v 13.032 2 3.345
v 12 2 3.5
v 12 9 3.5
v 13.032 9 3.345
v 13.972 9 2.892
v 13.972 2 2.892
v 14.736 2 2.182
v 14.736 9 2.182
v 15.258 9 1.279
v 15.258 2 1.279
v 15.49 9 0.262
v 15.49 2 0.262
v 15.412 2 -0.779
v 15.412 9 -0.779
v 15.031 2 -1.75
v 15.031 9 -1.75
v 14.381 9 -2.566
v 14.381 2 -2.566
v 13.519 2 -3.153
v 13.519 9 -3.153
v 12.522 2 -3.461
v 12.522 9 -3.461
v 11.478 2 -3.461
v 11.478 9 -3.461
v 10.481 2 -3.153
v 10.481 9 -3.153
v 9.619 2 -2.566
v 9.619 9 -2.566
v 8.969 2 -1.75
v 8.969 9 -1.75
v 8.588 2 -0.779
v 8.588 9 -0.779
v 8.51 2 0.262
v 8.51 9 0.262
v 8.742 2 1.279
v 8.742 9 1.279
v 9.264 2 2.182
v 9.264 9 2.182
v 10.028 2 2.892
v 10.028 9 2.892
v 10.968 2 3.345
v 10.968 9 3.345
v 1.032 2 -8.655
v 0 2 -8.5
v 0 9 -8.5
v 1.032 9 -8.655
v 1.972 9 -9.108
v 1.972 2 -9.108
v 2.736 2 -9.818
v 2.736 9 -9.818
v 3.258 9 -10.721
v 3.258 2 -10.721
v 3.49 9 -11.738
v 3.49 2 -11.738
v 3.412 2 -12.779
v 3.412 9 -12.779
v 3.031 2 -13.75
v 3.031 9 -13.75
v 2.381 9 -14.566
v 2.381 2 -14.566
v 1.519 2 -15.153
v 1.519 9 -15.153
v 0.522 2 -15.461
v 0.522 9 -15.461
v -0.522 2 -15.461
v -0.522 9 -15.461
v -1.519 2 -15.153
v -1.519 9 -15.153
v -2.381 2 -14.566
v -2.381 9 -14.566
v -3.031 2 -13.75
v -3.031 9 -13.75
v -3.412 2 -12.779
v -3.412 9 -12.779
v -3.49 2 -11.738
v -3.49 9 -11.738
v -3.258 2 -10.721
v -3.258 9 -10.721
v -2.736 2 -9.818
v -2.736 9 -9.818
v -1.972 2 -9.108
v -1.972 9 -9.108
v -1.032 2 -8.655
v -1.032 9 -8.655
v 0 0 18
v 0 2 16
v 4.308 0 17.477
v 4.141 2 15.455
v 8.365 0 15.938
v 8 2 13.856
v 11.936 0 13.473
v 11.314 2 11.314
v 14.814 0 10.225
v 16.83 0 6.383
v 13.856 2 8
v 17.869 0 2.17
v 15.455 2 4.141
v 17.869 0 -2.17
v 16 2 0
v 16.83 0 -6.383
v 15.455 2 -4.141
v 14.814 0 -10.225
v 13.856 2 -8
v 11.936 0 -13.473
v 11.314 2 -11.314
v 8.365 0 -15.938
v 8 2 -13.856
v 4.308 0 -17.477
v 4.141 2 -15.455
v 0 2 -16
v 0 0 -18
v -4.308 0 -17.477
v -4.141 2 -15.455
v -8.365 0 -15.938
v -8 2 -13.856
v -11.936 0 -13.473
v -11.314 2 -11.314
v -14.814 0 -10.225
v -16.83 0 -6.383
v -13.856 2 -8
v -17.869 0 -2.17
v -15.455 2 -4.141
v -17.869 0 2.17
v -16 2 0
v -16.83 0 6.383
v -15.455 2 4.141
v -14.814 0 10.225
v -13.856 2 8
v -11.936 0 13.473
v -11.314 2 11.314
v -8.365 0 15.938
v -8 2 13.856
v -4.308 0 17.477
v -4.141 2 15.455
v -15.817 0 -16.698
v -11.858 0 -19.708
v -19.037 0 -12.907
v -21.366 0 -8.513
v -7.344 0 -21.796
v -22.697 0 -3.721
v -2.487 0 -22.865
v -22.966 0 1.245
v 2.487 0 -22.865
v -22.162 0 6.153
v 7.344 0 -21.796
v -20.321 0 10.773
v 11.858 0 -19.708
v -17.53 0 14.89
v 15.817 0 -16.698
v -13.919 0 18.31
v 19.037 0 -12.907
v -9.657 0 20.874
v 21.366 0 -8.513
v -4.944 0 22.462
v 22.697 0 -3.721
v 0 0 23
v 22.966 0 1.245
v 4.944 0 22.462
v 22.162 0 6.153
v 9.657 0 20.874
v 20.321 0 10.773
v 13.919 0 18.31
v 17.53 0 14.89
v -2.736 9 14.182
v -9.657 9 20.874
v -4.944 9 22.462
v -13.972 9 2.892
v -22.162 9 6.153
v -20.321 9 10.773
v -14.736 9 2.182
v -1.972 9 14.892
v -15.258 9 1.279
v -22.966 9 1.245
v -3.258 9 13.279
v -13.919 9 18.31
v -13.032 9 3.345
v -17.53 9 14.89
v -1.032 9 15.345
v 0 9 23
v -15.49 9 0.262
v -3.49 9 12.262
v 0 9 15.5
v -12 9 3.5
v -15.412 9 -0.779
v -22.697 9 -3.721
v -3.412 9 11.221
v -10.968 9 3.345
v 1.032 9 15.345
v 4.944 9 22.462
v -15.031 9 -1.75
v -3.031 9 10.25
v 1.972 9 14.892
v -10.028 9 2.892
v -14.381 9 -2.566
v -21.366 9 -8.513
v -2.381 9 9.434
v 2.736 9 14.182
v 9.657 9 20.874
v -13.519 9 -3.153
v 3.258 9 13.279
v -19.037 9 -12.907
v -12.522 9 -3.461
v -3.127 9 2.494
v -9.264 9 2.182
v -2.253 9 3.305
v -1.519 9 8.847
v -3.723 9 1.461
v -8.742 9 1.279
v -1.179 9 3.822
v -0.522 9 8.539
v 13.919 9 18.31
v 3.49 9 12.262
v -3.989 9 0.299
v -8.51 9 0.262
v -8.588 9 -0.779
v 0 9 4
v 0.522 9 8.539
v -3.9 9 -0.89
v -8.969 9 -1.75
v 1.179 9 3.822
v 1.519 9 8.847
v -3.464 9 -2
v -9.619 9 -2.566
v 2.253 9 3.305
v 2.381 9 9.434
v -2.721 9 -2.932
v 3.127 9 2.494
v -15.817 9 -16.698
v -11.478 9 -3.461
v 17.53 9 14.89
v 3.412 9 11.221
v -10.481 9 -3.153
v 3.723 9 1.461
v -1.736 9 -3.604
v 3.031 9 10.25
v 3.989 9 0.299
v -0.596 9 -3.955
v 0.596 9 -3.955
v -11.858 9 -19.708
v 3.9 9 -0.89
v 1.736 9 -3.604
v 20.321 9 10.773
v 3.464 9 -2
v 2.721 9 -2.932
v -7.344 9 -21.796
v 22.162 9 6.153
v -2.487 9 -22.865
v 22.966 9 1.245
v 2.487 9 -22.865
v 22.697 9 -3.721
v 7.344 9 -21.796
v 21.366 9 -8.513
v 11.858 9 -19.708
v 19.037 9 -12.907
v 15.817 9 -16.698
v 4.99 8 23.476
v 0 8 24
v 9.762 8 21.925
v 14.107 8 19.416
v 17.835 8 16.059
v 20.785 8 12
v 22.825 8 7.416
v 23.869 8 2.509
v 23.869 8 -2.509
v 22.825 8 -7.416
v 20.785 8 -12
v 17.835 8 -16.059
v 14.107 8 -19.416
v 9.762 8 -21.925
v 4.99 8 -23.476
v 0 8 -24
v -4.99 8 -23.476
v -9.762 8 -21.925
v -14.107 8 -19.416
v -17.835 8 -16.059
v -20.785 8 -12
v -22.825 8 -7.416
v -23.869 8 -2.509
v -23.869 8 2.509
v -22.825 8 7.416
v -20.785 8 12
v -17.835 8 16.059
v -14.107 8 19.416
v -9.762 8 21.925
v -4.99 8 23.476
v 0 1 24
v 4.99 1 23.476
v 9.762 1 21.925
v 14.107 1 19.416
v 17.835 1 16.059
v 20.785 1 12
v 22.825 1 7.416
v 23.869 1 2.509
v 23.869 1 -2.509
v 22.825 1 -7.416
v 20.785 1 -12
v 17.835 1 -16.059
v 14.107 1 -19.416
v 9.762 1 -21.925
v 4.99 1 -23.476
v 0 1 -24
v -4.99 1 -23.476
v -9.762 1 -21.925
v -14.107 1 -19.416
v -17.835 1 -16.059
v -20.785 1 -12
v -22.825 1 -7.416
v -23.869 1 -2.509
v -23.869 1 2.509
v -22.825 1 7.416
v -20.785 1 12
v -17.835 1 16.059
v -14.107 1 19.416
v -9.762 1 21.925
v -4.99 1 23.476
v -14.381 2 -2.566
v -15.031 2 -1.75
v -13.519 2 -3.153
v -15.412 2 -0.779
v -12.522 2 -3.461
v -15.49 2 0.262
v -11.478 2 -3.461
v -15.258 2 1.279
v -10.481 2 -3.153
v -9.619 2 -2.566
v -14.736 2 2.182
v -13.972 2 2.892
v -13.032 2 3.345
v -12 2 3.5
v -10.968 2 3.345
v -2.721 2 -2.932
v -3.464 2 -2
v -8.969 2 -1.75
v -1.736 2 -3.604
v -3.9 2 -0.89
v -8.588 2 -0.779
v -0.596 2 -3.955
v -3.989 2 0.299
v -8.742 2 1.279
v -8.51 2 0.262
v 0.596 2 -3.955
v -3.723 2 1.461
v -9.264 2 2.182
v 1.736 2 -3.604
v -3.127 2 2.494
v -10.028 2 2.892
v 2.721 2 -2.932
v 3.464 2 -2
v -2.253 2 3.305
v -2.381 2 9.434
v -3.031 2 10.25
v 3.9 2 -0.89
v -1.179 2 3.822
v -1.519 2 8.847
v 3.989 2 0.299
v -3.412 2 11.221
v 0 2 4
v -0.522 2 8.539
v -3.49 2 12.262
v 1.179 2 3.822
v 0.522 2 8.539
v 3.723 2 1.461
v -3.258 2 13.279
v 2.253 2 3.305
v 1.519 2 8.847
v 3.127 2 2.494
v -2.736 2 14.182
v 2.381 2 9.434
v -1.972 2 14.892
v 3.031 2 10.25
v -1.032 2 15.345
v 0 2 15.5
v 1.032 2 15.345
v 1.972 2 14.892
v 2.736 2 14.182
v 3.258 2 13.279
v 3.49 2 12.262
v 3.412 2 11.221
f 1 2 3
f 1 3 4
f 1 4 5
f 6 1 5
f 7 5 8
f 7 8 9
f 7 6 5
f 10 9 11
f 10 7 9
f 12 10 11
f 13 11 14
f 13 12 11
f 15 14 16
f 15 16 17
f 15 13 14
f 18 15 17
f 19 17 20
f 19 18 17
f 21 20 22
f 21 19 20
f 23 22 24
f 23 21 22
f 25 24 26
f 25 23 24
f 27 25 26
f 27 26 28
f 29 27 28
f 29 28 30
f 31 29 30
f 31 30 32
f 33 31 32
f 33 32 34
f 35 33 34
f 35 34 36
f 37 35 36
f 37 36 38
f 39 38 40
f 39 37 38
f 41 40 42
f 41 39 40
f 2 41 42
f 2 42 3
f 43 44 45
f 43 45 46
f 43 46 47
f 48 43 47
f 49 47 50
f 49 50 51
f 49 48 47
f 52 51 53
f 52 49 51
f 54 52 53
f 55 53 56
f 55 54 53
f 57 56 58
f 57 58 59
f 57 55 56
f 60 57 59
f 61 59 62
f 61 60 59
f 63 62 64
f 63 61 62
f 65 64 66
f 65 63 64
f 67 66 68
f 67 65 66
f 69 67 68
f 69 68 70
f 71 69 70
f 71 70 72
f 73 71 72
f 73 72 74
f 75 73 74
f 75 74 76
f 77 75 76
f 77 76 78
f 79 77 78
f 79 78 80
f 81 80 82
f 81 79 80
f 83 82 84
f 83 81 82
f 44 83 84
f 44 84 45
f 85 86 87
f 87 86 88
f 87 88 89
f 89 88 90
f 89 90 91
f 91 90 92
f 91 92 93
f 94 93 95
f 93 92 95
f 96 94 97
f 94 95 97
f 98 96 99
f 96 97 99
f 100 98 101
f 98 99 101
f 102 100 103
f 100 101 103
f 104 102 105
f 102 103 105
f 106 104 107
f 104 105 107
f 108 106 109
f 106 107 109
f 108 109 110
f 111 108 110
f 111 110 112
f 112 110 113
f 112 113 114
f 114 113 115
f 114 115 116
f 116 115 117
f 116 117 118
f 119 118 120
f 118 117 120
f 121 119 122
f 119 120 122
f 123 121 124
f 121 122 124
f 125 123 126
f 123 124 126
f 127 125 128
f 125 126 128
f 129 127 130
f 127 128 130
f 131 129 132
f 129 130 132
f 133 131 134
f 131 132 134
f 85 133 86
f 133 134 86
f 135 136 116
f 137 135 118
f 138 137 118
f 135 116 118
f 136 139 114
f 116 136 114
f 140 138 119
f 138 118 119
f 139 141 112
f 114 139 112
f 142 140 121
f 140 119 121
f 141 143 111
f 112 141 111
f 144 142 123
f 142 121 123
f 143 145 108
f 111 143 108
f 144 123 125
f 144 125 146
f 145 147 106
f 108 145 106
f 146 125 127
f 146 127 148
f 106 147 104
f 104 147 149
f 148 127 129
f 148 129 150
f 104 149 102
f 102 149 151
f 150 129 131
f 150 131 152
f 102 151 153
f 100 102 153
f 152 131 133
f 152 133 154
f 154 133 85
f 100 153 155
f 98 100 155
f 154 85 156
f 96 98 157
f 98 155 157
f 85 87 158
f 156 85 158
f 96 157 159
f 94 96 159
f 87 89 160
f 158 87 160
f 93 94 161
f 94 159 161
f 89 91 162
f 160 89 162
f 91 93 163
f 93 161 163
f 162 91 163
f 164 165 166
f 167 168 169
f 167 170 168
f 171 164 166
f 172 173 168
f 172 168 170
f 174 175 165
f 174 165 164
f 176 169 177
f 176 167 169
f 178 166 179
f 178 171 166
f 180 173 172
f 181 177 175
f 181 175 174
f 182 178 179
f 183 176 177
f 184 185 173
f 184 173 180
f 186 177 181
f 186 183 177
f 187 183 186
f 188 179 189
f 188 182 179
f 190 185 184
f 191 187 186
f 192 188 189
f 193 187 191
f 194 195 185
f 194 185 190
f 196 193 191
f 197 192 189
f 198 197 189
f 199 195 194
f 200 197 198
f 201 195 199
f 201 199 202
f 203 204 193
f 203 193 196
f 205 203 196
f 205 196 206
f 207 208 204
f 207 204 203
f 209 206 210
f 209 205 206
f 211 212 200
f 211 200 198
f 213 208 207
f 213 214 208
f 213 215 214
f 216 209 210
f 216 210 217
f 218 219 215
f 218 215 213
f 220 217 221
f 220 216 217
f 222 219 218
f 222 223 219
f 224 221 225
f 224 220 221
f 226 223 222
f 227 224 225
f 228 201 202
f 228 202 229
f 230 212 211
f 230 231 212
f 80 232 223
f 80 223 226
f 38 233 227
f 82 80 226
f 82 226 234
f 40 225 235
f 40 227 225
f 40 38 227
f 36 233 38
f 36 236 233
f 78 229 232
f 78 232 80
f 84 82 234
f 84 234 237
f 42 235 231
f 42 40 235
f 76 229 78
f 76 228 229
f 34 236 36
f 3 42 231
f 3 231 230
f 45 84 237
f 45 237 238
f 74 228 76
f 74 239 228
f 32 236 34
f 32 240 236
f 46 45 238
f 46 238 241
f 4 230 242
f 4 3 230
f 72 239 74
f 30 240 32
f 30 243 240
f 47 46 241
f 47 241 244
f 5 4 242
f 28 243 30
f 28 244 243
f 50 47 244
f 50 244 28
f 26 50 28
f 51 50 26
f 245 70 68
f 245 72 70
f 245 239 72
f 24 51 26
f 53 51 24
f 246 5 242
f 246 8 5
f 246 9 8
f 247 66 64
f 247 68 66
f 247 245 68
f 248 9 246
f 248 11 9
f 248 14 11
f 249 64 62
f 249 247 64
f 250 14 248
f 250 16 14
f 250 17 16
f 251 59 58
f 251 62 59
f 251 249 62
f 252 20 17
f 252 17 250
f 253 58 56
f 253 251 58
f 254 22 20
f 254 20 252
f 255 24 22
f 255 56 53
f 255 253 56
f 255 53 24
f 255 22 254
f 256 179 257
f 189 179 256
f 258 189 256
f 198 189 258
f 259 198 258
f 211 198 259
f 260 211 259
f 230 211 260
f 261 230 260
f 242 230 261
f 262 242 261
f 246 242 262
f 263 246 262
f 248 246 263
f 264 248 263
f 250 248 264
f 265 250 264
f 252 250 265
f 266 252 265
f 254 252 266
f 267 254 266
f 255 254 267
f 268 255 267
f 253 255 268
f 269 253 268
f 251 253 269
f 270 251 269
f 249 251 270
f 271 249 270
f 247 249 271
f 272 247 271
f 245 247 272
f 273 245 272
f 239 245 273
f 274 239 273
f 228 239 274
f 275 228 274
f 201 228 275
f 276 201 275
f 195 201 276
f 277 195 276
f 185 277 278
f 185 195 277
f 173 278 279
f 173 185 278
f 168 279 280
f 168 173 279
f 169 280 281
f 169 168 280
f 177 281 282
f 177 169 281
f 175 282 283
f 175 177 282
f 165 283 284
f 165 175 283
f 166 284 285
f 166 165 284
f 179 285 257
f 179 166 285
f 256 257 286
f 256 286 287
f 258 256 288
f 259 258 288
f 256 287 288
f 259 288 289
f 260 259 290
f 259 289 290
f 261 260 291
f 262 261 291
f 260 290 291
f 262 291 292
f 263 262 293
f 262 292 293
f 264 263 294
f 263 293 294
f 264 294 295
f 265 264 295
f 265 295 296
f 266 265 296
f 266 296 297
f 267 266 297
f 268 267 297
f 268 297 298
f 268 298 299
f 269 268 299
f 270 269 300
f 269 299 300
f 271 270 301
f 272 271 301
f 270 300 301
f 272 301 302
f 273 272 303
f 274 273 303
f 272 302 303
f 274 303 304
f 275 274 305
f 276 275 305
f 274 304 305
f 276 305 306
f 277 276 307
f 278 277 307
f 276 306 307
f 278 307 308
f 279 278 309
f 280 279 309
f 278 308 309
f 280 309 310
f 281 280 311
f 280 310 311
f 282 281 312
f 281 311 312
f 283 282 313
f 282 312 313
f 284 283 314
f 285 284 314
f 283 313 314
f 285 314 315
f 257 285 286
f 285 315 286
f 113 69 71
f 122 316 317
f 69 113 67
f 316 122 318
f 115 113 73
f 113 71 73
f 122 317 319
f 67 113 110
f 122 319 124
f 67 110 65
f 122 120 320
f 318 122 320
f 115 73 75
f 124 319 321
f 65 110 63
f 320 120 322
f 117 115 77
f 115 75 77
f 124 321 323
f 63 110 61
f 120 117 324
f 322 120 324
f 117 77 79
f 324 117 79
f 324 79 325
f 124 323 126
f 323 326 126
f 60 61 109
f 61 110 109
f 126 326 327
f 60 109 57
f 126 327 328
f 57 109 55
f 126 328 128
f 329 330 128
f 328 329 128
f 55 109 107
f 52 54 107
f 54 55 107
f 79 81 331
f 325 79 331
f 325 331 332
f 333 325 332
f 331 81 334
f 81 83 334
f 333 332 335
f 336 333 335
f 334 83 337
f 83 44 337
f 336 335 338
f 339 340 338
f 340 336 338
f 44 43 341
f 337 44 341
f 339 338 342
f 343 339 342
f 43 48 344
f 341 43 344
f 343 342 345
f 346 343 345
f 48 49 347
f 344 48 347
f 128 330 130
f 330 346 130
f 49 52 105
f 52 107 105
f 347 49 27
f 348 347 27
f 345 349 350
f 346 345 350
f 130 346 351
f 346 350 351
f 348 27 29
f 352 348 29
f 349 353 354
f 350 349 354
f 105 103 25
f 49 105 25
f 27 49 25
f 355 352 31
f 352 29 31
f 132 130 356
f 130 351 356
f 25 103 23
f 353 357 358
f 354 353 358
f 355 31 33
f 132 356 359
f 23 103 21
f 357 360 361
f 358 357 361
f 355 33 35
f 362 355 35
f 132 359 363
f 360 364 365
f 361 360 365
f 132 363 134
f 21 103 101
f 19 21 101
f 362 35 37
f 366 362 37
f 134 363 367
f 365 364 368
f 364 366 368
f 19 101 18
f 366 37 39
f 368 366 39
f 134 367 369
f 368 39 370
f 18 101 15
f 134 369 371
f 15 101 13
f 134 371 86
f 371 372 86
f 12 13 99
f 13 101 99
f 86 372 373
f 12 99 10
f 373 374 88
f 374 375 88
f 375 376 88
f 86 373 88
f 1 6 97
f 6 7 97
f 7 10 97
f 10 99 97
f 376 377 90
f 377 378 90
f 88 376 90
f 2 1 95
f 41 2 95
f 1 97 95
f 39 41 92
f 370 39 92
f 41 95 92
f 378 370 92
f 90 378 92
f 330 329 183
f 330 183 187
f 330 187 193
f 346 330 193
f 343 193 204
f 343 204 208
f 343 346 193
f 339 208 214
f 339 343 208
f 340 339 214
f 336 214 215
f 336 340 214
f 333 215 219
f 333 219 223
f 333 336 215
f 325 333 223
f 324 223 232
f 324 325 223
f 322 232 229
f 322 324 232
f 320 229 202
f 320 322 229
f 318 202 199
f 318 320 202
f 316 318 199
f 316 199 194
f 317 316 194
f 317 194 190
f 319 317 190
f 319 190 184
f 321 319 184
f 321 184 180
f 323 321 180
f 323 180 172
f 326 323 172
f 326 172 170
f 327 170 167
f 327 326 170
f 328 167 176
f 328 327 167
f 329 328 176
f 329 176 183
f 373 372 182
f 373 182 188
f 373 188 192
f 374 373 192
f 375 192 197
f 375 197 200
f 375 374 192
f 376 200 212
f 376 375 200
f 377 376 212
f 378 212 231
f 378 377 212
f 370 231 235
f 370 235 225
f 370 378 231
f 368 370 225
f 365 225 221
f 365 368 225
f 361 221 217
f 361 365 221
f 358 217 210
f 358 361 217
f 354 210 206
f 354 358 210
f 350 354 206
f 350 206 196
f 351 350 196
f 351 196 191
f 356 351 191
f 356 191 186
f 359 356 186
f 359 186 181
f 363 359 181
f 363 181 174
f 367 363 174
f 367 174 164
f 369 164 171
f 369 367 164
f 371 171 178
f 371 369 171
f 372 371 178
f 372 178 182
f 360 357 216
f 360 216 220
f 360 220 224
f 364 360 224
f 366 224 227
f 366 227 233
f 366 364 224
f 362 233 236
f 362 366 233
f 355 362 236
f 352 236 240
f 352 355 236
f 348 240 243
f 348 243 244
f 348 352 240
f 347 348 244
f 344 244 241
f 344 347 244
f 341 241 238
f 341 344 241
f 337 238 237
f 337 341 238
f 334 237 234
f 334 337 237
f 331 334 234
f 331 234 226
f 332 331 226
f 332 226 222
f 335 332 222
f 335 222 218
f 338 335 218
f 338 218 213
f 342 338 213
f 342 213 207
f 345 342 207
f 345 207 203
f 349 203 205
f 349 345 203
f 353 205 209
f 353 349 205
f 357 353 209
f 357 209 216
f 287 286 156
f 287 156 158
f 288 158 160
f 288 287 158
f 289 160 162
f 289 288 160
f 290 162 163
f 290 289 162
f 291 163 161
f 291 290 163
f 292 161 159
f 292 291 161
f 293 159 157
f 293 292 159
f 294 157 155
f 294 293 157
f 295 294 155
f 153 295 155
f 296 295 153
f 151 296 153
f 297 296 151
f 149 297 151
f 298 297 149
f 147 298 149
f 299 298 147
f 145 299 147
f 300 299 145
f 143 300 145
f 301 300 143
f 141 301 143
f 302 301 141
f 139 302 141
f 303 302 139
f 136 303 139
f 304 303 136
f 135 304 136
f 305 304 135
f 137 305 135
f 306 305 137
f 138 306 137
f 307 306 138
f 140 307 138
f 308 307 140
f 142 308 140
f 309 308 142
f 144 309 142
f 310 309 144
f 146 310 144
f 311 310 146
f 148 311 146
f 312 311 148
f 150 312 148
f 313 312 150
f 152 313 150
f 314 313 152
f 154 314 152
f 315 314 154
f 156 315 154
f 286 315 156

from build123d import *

# Parameters (mm, degrees)
SKETCH2_R           = 24
SKETCH2_R_2         = 18
BOSS_EXTRUDE2_DEPTH = 9
BOSS_EXTRUDE3_START = 2
SKETCH2_3_R         = 18
SKETCH2_3_R_2       = 16
SKETCH2_3_R_3       = 3.5
SKETCH2_3_R_4       = 4
BOSS_EXTRUDE3_DEPTH = 7
CHAMFER1_SIZE       = 1
CHAMFER2_SIZE       = 2


with BuildPart() as part:
    # Sketch2 → Boss-Extrude2 (new body)
    with BuildSketch(Plane(origin=(0, 0, 0), x_dir=(1, 0, 0), z_dir=(0, 1, 0))):
        with Locations(Location((0, 0, 0), (0, 0, 270))):
            Circle(SKETCH2_R)
        with Locations(Location((0, 0, 0), (0, 0, 270))):
            Circle(SKETCH2_R_2, mode=Mode.SUBTRACT)
    extrude(amount=BOSS_EXTRUDE2_DEPTH)

    # Sketch2<3> → Boss-Extrude3 (add)
    # profile 1 of 2: a face of its own
    with BuildSketch(Plane(origin=(0, 0, 0), x_dir=(1, 0, 0), z_dir=(0, 1, 0)).offset(BOSS_EXTRUDE3_START)):
        with Locations(Location((0, 0, 0), (0, 0, 270))):
            Circle(SKETCH2_3_R)
        Circle(SKETCH2_3_R_2, mode=Mode.SUBTRACT)
    # profile 2 of 2: a face of its own
    with BuildSketch(Plane(origin=(0, 0, 0), x_dir=(1, 0, 0), z_dir=(0, 1, 0)).offset(BOSS_EXTRUDE3_START)):
        Circle(SKETCH2_3_R_2)
        with Locations(Location((-12, 0, 0), (0, 0, 270))):
            Circle(SKETCH2_3_R_3, mode=Mode.SUBTRACT)
        with Locations(Location((0, -12, 0), (0, 0, 270))):
            Circle(SKETCH2_3_R_3, mode=Mode.SUBTRACT)
        with Locations(Location((12, 0, 0), (0, 0, 270))):
            Circle(SKETCH2_3_R_3, mode=Mode.SUBTRACT)
        with Locations(Location((0, 12, 0), (0, 0, 270))):
            Circle(SKETCH2_3_R_3, mode=Mode.SUBTRACT)
        with Locations(Location((0, 0, 0), (0, 0, 270))):
            Circle(SKETCH2_3_R_4, mode=Mode.SUBTRACT)
    extrude(amount=BOSS_EXTRUDE3_DEPTH)

    # Chamfer1
    chamfer1_edges = [part.edges().sort_by_distance(p)[0] for p in [
        (0, 9, -24),
        (0, 0, -24),
    ]]
    chamfer(chamfer1_edges, length=CHAMFER1_SIZE)

    # Chamfer2
    chamfer2_edges = [part.edges().sort_by_distance(p)[0] for p in [
        (0, 2, -18),
    ]]
    chamfer(chamfer2_edges, length=CHAMFER2_SIZE - 0.0001)  # a hair under: the kernel refuses the full size


solid = part.part
